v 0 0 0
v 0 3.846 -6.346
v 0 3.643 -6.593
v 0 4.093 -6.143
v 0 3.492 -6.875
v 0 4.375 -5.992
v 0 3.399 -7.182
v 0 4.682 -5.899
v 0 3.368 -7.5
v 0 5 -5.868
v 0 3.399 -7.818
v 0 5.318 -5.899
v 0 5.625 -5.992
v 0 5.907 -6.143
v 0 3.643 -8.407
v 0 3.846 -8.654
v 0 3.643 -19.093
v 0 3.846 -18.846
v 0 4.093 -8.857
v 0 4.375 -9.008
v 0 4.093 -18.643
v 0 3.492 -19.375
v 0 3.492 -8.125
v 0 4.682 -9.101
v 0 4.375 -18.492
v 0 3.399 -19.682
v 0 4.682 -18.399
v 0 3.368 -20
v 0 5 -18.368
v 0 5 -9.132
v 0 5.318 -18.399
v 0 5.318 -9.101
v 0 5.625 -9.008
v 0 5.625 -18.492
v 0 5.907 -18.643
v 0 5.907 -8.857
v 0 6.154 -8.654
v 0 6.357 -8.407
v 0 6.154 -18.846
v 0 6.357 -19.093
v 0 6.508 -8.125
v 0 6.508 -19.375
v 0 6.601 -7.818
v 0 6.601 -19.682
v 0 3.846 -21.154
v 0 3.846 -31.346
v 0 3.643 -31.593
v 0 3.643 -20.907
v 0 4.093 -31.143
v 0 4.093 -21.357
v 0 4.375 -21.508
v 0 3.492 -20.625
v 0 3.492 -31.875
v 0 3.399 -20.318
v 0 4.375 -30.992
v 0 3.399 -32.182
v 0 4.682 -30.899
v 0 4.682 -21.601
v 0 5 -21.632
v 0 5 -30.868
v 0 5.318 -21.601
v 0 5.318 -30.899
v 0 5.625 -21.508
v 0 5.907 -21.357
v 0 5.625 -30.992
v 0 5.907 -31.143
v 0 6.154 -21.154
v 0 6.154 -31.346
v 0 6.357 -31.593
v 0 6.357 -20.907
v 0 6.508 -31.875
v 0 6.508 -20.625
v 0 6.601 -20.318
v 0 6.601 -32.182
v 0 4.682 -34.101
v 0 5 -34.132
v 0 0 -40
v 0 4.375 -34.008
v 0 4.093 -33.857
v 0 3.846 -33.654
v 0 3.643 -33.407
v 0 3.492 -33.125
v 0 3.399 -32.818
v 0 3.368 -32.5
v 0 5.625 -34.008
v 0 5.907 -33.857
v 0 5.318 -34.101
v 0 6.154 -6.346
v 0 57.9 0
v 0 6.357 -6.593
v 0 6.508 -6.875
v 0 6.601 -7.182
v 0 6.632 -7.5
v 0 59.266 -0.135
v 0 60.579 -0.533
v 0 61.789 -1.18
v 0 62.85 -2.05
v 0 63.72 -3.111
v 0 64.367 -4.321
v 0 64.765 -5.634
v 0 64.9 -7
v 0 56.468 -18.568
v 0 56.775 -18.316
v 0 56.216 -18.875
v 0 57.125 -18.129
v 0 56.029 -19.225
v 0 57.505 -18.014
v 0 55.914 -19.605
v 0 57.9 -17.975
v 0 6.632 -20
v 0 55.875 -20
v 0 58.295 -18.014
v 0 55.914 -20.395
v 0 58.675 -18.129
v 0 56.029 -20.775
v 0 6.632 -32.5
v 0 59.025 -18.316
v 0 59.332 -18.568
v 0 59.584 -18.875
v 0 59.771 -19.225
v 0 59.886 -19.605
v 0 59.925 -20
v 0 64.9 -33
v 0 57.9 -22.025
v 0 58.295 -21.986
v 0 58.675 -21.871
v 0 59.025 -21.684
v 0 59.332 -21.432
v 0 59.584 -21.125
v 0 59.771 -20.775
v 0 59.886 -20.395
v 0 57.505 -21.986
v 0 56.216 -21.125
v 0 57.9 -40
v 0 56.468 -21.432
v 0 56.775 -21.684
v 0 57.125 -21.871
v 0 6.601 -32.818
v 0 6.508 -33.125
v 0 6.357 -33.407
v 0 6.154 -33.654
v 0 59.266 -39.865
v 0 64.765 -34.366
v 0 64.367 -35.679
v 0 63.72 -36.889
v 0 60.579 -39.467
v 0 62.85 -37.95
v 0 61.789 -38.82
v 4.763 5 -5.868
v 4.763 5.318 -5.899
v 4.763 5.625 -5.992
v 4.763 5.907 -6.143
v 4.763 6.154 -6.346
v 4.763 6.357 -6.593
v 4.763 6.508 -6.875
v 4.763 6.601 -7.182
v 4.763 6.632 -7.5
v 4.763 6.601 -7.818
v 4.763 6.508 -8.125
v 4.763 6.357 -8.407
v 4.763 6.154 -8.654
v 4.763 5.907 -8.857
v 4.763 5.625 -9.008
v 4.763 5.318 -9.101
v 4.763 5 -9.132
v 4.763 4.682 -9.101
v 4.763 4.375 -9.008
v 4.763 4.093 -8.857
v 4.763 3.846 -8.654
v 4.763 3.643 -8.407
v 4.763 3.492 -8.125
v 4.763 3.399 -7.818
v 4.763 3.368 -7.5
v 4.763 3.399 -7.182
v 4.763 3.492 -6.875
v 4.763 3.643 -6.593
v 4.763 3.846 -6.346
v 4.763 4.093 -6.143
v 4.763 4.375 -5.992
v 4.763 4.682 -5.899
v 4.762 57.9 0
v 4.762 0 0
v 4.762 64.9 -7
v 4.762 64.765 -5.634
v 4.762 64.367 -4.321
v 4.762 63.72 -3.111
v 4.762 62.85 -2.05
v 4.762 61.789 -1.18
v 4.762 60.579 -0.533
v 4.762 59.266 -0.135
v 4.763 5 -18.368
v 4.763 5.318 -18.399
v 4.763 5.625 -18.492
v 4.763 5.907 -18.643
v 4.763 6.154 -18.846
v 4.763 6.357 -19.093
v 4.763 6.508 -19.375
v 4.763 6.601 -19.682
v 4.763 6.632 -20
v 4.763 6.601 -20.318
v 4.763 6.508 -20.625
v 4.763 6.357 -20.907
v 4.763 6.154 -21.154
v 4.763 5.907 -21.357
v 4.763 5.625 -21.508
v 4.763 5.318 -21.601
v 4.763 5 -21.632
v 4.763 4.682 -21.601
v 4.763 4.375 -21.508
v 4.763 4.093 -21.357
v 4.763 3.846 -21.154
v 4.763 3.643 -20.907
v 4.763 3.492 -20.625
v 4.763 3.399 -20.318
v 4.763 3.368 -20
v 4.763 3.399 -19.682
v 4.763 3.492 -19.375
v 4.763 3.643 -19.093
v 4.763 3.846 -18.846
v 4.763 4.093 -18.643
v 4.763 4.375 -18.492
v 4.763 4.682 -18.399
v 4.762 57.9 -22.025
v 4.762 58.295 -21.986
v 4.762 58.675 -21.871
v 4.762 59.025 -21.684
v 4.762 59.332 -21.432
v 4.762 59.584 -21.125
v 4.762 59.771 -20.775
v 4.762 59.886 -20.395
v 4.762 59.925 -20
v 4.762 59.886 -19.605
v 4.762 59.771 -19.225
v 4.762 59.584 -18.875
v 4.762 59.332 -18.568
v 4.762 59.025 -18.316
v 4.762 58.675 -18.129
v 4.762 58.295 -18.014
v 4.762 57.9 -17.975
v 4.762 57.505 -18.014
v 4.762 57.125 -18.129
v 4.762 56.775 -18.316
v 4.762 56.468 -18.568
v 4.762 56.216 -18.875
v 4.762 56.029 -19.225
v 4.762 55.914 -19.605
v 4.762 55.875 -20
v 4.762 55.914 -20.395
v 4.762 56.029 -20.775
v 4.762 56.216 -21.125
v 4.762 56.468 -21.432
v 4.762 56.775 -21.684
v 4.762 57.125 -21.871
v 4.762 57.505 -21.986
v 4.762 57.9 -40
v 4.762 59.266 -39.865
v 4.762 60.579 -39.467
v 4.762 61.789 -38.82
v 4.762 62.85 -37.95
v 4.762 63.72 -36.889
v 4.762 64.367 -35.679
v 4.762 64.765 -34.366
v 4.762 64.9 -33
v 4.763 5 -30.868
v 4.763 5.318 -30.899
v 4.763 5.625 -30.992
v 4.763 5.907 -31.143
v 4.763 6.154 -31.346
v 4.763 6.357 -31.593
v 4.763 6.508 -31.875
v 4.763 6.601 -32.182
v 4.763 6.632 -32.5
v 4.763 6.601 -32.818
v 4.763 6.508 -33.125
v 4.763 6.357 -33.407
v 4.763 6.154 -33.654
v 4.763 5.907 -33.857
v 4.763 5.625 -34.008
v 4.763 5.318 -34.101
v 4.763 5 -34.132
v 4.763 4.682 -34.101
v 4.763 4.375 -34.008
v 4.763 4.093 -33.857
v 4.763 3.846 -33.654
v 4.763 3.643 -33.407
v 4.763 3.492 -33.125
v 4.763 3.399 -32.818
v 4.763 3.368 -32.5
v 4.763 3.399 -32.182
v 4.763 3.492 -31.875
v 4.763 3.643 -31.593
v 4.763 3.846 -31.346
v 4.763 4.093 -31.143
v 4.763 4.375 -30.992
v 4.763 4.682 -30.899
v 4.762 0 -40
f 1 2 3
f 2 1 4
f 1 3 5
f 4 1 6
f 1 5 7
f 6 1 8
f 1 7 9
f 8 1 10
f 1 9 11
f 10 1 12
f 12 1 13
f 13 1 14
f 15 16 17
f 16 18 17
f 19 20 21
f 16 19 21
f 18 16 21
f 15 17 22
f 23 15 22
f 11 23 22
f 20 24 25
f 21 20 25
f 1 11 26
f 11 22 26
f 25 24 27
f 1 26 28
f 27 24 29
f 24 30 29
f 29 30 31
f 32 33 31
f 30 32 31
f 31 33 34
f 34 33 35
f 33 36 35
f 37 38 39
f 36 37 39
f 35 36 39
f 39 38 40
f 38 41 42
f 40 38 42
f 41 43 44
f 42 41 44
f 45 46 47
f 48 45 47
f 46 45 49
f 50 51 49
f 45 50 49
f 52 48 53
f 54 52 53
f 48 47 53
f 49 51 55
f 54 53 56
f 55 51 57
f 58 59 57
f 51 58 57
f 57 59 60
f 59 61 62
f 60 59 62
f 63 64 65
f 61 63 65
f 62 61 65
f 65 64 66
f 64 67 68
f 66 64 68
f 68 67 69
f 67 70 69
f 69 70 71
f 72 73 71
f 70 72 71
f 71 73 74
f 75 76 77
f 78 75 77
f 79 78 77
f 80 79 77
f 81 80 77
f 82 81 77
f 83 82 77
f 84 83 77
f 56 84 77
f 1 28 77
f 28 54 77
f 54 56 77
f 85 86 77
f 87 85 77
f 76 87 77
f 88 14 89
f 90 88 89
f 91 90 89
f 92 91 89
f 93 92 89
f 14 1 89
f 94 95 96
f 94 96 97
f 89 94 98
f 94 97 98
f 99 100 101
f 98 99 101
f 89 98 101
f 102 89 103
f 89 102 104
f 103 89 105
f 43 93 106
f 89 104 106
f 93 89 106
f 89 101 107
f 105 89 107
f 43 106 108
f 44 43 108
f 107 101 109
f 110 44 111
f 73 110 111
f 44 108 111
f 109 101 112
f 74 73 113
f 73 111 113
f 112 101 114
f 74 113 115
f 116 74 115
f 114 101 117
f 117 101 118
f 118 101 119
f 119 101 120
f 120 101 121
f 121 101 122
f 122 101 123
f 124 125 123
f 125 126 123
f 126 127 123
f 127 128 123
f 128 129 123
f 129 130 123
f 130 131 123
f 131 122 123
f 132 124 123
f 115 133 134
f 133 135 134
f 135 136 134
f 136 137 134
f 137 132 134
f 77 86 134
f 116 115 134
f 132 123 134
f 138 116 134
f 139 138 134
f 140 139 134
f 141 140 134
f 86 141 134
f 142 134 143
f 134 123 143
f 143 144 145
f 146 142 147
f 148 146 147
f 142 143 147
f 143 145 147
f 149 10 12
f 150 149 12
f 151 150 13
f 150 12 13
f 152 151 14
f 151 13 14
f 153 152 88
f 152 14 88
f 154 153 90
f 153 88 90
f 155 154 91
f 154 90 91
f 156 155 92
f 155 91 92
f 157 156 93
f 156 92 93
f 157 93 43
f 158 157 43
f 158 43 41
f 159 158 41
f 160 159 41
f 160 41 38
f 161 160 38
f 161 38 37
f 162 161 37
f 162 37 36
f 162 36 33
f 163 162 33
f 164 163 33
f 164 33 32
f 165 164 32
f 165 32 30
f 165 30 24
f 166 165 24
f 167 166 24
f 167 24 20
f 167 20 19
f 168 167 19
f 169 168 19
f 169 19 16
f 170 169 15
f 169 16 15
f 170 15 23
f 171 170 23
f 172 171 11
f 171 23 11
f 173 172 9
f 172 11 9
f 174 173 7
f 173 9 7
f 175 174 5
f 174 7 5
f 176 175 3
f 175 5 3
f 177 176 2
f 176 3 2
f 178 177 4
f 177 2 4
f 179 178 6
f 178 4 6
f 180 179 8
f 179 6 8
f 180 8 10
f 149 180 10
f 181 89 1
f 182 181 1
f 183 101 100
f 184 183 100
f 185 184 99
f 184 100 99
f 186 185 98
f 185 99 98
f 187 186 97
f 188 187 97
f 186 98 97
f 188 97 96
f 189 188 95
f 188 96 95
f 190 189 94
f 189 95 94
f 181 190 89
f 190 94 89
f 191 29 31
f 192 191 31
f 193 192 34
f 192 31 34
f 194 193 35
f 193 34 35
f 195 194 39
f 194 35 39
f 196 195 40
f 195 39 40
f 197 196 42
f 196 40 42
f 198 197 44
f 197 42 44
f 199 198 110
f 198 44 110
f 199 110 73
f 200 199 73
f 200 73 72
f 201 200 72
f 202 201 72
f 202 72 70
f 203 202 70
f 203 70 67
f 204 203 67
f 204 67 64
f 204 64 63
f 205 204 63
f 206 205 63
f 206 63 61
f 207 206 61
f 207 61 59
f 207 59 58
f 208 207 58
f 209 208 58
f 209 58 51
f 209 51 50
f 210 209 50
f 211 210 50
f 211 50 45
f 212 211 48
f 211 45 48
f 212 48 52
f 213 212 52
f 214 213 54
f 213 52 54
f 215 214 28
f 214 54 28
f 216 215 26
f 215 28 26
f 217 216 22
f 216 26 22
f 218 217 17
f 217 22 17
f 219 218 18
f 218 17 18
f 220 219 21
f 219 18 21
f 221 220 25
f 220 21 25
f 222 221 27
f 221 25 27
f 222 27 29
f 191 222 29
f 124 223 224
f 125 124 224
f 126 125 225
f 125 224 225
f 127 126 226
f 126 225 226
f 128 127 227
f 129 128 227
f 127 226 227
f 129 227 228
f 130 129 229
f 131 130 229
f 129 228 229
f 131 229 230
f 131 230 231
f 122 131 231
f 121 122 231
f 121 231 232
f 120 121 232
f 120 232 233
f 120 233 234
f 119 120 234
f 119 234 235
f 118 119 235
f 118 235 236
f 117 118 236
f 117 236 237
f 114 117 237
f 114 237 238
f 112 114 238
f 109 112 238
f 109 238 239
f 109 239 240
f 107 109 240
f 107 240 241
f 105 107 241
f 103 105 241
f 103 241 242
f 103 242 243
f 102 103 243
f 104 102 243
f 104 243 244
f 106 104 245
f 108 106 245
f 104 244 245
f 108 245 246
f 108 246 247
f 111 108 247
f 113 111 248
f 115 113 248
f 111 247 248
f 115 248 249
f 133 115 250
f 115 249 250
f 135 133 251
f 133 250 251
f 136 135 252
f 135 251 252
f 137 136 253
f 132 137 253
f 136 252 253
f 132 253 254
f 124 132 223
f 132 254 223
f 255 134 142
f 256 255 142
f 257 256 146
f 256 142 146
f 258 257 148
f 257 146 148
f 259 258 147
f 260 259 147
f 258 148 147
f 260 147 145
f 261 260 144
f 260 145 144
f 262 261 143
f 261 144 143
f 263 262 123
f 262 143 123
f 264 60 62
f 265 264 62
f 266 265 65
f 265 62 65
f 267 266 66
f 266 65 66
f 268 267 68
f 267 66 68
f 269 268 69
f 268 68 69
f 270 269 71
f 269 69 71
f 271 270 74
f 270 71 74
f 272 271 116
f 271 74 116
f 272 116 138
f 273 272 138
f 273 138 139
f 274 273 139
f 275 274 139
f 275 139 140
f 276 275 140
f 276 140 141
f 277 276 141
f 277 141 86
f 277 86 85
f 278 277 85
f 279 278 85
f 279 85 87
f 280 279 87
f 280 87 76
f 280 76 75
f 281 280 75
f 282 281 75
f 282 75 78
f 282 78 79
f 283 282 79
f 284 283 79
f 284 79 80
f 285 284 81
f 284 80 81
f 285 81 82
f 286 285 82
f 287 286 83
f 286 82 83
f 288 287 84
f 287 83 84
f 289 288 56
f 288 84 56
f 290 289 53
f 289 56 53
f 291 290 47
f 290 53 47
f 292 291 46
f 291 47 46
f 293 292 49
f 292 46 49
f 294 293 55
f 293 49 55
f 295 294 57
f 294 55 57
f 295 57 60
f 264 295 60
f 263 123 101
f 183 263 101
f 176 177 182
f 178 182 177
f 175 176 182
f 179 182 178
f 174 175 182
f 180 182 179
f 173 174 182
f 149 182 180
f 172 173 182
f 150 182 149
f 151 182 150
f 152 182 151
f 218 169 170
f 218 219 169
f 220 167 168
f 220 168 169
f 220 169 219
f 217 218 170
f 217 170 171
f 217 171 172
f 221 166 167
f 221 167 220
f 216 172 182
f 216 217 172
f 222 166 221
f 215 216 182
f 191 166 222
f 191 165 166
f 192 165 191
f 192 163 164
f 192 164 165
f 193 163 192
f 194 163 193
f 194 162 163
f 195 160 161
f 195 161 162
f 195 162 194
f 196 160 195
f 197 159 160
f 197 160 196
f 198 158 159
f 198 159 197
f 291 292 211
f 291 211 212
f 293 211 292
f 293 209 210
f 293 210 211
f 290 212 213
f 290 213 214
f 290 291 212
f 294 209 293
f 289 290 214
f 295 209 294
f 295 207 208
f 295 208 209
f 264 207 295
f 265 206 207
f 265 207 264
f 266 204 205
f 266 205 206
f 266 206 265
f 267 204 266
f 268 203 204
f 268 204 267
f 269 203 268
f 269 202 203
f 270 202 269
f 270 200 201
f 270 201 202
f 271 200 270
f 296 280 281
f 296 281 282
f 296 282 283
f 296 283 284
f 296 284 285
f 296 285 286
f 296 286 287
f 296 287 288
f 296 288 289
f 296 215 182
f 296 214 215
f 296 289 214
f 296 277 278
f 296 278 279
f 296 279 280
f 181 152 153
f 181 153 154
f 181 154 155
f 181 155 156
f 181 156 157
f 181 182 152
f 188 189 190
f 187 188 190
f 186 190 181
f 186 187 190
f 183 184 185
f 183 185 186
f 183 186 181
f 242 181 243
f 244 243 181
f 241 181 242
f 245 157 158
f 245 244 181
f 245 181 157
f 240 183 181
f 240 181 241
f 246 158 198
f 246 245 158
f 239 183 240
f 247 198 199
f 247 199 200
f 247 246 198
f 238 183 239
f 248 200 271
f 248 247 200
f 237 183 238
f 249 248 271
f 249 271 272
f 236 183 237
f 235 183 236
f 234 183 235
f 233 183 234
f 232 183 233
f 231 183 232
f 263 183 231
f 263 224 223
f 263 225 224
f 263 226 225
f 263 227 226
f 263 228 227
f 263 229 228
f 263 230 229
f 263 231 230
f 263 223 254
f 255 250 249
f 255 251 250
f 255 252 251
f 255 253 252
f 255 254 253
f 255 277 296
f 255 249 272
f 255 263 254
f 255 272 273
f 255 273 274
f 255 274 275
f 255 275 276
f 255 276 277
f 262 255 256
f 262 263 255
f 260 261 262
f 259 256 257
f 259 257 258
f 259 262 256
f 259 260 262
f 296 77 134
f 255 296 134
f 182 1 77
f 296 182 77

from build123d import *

# Parameters (mm, degrees)
BOSS_EXTRUDE1_DEPTH   = 4.7625
F_4_CLEARANCE_HOLE1_D = 3.2639
SKETCH10_R            = 2.025
CUT_EXTRUDE1_DEPTH    = 10


with BuildPart() as part:
    # Sketch1 → Boss-Extrude1 (new body)
    with BuildSketch(Plane(origin=(0, 0, 0), x_dir=(0, 0, -1), z_dir=(1, 0, 0))):
        with BuildLine():
            Line((0, 0), (40, 0))
            Line((40, 0), (40, 57.9))
            ThreePointArc((40, 57.9), (37.949747468, 62.849747468), (33, 64.9))
            Line((33, 64.9), (7, 64.9))
            ThreePointArc((7, 64.9), (2.050252532, 62.849747468), (0, 57.9))
            Line((0, 57.9), (0, 0))
        make_face()
    extrude(amount=BOSS_EXTRUDE1_DEPTH)

    # #4 Clearance Hole1 (through all)
    with Locations(Plane(origin=(4.7625, 0, 0), x_dir=(0, 0, -1), z_dir=(1, 0, 0))):
        with Locations((7.5, 5), (20, 5), (32.5, 5)):
            Hole(F_4_CLEARANCE_HOLE1_D / 2)

    # Sketch10 → Cut-Extrude1 (cut)
    with BuildSketch(Plane(origin=(4.7625, 0, 0), x_dir=(0, 0, -1), z_dir=(1, 0, 0))):
        with Locations((20, 57.9)):
            Circle(SKETCH10_R)
    extrude(amount=-CUT_EXTRUDE1_DEPTH, mode=Mode.SUBTRACT)


solid = part.part
